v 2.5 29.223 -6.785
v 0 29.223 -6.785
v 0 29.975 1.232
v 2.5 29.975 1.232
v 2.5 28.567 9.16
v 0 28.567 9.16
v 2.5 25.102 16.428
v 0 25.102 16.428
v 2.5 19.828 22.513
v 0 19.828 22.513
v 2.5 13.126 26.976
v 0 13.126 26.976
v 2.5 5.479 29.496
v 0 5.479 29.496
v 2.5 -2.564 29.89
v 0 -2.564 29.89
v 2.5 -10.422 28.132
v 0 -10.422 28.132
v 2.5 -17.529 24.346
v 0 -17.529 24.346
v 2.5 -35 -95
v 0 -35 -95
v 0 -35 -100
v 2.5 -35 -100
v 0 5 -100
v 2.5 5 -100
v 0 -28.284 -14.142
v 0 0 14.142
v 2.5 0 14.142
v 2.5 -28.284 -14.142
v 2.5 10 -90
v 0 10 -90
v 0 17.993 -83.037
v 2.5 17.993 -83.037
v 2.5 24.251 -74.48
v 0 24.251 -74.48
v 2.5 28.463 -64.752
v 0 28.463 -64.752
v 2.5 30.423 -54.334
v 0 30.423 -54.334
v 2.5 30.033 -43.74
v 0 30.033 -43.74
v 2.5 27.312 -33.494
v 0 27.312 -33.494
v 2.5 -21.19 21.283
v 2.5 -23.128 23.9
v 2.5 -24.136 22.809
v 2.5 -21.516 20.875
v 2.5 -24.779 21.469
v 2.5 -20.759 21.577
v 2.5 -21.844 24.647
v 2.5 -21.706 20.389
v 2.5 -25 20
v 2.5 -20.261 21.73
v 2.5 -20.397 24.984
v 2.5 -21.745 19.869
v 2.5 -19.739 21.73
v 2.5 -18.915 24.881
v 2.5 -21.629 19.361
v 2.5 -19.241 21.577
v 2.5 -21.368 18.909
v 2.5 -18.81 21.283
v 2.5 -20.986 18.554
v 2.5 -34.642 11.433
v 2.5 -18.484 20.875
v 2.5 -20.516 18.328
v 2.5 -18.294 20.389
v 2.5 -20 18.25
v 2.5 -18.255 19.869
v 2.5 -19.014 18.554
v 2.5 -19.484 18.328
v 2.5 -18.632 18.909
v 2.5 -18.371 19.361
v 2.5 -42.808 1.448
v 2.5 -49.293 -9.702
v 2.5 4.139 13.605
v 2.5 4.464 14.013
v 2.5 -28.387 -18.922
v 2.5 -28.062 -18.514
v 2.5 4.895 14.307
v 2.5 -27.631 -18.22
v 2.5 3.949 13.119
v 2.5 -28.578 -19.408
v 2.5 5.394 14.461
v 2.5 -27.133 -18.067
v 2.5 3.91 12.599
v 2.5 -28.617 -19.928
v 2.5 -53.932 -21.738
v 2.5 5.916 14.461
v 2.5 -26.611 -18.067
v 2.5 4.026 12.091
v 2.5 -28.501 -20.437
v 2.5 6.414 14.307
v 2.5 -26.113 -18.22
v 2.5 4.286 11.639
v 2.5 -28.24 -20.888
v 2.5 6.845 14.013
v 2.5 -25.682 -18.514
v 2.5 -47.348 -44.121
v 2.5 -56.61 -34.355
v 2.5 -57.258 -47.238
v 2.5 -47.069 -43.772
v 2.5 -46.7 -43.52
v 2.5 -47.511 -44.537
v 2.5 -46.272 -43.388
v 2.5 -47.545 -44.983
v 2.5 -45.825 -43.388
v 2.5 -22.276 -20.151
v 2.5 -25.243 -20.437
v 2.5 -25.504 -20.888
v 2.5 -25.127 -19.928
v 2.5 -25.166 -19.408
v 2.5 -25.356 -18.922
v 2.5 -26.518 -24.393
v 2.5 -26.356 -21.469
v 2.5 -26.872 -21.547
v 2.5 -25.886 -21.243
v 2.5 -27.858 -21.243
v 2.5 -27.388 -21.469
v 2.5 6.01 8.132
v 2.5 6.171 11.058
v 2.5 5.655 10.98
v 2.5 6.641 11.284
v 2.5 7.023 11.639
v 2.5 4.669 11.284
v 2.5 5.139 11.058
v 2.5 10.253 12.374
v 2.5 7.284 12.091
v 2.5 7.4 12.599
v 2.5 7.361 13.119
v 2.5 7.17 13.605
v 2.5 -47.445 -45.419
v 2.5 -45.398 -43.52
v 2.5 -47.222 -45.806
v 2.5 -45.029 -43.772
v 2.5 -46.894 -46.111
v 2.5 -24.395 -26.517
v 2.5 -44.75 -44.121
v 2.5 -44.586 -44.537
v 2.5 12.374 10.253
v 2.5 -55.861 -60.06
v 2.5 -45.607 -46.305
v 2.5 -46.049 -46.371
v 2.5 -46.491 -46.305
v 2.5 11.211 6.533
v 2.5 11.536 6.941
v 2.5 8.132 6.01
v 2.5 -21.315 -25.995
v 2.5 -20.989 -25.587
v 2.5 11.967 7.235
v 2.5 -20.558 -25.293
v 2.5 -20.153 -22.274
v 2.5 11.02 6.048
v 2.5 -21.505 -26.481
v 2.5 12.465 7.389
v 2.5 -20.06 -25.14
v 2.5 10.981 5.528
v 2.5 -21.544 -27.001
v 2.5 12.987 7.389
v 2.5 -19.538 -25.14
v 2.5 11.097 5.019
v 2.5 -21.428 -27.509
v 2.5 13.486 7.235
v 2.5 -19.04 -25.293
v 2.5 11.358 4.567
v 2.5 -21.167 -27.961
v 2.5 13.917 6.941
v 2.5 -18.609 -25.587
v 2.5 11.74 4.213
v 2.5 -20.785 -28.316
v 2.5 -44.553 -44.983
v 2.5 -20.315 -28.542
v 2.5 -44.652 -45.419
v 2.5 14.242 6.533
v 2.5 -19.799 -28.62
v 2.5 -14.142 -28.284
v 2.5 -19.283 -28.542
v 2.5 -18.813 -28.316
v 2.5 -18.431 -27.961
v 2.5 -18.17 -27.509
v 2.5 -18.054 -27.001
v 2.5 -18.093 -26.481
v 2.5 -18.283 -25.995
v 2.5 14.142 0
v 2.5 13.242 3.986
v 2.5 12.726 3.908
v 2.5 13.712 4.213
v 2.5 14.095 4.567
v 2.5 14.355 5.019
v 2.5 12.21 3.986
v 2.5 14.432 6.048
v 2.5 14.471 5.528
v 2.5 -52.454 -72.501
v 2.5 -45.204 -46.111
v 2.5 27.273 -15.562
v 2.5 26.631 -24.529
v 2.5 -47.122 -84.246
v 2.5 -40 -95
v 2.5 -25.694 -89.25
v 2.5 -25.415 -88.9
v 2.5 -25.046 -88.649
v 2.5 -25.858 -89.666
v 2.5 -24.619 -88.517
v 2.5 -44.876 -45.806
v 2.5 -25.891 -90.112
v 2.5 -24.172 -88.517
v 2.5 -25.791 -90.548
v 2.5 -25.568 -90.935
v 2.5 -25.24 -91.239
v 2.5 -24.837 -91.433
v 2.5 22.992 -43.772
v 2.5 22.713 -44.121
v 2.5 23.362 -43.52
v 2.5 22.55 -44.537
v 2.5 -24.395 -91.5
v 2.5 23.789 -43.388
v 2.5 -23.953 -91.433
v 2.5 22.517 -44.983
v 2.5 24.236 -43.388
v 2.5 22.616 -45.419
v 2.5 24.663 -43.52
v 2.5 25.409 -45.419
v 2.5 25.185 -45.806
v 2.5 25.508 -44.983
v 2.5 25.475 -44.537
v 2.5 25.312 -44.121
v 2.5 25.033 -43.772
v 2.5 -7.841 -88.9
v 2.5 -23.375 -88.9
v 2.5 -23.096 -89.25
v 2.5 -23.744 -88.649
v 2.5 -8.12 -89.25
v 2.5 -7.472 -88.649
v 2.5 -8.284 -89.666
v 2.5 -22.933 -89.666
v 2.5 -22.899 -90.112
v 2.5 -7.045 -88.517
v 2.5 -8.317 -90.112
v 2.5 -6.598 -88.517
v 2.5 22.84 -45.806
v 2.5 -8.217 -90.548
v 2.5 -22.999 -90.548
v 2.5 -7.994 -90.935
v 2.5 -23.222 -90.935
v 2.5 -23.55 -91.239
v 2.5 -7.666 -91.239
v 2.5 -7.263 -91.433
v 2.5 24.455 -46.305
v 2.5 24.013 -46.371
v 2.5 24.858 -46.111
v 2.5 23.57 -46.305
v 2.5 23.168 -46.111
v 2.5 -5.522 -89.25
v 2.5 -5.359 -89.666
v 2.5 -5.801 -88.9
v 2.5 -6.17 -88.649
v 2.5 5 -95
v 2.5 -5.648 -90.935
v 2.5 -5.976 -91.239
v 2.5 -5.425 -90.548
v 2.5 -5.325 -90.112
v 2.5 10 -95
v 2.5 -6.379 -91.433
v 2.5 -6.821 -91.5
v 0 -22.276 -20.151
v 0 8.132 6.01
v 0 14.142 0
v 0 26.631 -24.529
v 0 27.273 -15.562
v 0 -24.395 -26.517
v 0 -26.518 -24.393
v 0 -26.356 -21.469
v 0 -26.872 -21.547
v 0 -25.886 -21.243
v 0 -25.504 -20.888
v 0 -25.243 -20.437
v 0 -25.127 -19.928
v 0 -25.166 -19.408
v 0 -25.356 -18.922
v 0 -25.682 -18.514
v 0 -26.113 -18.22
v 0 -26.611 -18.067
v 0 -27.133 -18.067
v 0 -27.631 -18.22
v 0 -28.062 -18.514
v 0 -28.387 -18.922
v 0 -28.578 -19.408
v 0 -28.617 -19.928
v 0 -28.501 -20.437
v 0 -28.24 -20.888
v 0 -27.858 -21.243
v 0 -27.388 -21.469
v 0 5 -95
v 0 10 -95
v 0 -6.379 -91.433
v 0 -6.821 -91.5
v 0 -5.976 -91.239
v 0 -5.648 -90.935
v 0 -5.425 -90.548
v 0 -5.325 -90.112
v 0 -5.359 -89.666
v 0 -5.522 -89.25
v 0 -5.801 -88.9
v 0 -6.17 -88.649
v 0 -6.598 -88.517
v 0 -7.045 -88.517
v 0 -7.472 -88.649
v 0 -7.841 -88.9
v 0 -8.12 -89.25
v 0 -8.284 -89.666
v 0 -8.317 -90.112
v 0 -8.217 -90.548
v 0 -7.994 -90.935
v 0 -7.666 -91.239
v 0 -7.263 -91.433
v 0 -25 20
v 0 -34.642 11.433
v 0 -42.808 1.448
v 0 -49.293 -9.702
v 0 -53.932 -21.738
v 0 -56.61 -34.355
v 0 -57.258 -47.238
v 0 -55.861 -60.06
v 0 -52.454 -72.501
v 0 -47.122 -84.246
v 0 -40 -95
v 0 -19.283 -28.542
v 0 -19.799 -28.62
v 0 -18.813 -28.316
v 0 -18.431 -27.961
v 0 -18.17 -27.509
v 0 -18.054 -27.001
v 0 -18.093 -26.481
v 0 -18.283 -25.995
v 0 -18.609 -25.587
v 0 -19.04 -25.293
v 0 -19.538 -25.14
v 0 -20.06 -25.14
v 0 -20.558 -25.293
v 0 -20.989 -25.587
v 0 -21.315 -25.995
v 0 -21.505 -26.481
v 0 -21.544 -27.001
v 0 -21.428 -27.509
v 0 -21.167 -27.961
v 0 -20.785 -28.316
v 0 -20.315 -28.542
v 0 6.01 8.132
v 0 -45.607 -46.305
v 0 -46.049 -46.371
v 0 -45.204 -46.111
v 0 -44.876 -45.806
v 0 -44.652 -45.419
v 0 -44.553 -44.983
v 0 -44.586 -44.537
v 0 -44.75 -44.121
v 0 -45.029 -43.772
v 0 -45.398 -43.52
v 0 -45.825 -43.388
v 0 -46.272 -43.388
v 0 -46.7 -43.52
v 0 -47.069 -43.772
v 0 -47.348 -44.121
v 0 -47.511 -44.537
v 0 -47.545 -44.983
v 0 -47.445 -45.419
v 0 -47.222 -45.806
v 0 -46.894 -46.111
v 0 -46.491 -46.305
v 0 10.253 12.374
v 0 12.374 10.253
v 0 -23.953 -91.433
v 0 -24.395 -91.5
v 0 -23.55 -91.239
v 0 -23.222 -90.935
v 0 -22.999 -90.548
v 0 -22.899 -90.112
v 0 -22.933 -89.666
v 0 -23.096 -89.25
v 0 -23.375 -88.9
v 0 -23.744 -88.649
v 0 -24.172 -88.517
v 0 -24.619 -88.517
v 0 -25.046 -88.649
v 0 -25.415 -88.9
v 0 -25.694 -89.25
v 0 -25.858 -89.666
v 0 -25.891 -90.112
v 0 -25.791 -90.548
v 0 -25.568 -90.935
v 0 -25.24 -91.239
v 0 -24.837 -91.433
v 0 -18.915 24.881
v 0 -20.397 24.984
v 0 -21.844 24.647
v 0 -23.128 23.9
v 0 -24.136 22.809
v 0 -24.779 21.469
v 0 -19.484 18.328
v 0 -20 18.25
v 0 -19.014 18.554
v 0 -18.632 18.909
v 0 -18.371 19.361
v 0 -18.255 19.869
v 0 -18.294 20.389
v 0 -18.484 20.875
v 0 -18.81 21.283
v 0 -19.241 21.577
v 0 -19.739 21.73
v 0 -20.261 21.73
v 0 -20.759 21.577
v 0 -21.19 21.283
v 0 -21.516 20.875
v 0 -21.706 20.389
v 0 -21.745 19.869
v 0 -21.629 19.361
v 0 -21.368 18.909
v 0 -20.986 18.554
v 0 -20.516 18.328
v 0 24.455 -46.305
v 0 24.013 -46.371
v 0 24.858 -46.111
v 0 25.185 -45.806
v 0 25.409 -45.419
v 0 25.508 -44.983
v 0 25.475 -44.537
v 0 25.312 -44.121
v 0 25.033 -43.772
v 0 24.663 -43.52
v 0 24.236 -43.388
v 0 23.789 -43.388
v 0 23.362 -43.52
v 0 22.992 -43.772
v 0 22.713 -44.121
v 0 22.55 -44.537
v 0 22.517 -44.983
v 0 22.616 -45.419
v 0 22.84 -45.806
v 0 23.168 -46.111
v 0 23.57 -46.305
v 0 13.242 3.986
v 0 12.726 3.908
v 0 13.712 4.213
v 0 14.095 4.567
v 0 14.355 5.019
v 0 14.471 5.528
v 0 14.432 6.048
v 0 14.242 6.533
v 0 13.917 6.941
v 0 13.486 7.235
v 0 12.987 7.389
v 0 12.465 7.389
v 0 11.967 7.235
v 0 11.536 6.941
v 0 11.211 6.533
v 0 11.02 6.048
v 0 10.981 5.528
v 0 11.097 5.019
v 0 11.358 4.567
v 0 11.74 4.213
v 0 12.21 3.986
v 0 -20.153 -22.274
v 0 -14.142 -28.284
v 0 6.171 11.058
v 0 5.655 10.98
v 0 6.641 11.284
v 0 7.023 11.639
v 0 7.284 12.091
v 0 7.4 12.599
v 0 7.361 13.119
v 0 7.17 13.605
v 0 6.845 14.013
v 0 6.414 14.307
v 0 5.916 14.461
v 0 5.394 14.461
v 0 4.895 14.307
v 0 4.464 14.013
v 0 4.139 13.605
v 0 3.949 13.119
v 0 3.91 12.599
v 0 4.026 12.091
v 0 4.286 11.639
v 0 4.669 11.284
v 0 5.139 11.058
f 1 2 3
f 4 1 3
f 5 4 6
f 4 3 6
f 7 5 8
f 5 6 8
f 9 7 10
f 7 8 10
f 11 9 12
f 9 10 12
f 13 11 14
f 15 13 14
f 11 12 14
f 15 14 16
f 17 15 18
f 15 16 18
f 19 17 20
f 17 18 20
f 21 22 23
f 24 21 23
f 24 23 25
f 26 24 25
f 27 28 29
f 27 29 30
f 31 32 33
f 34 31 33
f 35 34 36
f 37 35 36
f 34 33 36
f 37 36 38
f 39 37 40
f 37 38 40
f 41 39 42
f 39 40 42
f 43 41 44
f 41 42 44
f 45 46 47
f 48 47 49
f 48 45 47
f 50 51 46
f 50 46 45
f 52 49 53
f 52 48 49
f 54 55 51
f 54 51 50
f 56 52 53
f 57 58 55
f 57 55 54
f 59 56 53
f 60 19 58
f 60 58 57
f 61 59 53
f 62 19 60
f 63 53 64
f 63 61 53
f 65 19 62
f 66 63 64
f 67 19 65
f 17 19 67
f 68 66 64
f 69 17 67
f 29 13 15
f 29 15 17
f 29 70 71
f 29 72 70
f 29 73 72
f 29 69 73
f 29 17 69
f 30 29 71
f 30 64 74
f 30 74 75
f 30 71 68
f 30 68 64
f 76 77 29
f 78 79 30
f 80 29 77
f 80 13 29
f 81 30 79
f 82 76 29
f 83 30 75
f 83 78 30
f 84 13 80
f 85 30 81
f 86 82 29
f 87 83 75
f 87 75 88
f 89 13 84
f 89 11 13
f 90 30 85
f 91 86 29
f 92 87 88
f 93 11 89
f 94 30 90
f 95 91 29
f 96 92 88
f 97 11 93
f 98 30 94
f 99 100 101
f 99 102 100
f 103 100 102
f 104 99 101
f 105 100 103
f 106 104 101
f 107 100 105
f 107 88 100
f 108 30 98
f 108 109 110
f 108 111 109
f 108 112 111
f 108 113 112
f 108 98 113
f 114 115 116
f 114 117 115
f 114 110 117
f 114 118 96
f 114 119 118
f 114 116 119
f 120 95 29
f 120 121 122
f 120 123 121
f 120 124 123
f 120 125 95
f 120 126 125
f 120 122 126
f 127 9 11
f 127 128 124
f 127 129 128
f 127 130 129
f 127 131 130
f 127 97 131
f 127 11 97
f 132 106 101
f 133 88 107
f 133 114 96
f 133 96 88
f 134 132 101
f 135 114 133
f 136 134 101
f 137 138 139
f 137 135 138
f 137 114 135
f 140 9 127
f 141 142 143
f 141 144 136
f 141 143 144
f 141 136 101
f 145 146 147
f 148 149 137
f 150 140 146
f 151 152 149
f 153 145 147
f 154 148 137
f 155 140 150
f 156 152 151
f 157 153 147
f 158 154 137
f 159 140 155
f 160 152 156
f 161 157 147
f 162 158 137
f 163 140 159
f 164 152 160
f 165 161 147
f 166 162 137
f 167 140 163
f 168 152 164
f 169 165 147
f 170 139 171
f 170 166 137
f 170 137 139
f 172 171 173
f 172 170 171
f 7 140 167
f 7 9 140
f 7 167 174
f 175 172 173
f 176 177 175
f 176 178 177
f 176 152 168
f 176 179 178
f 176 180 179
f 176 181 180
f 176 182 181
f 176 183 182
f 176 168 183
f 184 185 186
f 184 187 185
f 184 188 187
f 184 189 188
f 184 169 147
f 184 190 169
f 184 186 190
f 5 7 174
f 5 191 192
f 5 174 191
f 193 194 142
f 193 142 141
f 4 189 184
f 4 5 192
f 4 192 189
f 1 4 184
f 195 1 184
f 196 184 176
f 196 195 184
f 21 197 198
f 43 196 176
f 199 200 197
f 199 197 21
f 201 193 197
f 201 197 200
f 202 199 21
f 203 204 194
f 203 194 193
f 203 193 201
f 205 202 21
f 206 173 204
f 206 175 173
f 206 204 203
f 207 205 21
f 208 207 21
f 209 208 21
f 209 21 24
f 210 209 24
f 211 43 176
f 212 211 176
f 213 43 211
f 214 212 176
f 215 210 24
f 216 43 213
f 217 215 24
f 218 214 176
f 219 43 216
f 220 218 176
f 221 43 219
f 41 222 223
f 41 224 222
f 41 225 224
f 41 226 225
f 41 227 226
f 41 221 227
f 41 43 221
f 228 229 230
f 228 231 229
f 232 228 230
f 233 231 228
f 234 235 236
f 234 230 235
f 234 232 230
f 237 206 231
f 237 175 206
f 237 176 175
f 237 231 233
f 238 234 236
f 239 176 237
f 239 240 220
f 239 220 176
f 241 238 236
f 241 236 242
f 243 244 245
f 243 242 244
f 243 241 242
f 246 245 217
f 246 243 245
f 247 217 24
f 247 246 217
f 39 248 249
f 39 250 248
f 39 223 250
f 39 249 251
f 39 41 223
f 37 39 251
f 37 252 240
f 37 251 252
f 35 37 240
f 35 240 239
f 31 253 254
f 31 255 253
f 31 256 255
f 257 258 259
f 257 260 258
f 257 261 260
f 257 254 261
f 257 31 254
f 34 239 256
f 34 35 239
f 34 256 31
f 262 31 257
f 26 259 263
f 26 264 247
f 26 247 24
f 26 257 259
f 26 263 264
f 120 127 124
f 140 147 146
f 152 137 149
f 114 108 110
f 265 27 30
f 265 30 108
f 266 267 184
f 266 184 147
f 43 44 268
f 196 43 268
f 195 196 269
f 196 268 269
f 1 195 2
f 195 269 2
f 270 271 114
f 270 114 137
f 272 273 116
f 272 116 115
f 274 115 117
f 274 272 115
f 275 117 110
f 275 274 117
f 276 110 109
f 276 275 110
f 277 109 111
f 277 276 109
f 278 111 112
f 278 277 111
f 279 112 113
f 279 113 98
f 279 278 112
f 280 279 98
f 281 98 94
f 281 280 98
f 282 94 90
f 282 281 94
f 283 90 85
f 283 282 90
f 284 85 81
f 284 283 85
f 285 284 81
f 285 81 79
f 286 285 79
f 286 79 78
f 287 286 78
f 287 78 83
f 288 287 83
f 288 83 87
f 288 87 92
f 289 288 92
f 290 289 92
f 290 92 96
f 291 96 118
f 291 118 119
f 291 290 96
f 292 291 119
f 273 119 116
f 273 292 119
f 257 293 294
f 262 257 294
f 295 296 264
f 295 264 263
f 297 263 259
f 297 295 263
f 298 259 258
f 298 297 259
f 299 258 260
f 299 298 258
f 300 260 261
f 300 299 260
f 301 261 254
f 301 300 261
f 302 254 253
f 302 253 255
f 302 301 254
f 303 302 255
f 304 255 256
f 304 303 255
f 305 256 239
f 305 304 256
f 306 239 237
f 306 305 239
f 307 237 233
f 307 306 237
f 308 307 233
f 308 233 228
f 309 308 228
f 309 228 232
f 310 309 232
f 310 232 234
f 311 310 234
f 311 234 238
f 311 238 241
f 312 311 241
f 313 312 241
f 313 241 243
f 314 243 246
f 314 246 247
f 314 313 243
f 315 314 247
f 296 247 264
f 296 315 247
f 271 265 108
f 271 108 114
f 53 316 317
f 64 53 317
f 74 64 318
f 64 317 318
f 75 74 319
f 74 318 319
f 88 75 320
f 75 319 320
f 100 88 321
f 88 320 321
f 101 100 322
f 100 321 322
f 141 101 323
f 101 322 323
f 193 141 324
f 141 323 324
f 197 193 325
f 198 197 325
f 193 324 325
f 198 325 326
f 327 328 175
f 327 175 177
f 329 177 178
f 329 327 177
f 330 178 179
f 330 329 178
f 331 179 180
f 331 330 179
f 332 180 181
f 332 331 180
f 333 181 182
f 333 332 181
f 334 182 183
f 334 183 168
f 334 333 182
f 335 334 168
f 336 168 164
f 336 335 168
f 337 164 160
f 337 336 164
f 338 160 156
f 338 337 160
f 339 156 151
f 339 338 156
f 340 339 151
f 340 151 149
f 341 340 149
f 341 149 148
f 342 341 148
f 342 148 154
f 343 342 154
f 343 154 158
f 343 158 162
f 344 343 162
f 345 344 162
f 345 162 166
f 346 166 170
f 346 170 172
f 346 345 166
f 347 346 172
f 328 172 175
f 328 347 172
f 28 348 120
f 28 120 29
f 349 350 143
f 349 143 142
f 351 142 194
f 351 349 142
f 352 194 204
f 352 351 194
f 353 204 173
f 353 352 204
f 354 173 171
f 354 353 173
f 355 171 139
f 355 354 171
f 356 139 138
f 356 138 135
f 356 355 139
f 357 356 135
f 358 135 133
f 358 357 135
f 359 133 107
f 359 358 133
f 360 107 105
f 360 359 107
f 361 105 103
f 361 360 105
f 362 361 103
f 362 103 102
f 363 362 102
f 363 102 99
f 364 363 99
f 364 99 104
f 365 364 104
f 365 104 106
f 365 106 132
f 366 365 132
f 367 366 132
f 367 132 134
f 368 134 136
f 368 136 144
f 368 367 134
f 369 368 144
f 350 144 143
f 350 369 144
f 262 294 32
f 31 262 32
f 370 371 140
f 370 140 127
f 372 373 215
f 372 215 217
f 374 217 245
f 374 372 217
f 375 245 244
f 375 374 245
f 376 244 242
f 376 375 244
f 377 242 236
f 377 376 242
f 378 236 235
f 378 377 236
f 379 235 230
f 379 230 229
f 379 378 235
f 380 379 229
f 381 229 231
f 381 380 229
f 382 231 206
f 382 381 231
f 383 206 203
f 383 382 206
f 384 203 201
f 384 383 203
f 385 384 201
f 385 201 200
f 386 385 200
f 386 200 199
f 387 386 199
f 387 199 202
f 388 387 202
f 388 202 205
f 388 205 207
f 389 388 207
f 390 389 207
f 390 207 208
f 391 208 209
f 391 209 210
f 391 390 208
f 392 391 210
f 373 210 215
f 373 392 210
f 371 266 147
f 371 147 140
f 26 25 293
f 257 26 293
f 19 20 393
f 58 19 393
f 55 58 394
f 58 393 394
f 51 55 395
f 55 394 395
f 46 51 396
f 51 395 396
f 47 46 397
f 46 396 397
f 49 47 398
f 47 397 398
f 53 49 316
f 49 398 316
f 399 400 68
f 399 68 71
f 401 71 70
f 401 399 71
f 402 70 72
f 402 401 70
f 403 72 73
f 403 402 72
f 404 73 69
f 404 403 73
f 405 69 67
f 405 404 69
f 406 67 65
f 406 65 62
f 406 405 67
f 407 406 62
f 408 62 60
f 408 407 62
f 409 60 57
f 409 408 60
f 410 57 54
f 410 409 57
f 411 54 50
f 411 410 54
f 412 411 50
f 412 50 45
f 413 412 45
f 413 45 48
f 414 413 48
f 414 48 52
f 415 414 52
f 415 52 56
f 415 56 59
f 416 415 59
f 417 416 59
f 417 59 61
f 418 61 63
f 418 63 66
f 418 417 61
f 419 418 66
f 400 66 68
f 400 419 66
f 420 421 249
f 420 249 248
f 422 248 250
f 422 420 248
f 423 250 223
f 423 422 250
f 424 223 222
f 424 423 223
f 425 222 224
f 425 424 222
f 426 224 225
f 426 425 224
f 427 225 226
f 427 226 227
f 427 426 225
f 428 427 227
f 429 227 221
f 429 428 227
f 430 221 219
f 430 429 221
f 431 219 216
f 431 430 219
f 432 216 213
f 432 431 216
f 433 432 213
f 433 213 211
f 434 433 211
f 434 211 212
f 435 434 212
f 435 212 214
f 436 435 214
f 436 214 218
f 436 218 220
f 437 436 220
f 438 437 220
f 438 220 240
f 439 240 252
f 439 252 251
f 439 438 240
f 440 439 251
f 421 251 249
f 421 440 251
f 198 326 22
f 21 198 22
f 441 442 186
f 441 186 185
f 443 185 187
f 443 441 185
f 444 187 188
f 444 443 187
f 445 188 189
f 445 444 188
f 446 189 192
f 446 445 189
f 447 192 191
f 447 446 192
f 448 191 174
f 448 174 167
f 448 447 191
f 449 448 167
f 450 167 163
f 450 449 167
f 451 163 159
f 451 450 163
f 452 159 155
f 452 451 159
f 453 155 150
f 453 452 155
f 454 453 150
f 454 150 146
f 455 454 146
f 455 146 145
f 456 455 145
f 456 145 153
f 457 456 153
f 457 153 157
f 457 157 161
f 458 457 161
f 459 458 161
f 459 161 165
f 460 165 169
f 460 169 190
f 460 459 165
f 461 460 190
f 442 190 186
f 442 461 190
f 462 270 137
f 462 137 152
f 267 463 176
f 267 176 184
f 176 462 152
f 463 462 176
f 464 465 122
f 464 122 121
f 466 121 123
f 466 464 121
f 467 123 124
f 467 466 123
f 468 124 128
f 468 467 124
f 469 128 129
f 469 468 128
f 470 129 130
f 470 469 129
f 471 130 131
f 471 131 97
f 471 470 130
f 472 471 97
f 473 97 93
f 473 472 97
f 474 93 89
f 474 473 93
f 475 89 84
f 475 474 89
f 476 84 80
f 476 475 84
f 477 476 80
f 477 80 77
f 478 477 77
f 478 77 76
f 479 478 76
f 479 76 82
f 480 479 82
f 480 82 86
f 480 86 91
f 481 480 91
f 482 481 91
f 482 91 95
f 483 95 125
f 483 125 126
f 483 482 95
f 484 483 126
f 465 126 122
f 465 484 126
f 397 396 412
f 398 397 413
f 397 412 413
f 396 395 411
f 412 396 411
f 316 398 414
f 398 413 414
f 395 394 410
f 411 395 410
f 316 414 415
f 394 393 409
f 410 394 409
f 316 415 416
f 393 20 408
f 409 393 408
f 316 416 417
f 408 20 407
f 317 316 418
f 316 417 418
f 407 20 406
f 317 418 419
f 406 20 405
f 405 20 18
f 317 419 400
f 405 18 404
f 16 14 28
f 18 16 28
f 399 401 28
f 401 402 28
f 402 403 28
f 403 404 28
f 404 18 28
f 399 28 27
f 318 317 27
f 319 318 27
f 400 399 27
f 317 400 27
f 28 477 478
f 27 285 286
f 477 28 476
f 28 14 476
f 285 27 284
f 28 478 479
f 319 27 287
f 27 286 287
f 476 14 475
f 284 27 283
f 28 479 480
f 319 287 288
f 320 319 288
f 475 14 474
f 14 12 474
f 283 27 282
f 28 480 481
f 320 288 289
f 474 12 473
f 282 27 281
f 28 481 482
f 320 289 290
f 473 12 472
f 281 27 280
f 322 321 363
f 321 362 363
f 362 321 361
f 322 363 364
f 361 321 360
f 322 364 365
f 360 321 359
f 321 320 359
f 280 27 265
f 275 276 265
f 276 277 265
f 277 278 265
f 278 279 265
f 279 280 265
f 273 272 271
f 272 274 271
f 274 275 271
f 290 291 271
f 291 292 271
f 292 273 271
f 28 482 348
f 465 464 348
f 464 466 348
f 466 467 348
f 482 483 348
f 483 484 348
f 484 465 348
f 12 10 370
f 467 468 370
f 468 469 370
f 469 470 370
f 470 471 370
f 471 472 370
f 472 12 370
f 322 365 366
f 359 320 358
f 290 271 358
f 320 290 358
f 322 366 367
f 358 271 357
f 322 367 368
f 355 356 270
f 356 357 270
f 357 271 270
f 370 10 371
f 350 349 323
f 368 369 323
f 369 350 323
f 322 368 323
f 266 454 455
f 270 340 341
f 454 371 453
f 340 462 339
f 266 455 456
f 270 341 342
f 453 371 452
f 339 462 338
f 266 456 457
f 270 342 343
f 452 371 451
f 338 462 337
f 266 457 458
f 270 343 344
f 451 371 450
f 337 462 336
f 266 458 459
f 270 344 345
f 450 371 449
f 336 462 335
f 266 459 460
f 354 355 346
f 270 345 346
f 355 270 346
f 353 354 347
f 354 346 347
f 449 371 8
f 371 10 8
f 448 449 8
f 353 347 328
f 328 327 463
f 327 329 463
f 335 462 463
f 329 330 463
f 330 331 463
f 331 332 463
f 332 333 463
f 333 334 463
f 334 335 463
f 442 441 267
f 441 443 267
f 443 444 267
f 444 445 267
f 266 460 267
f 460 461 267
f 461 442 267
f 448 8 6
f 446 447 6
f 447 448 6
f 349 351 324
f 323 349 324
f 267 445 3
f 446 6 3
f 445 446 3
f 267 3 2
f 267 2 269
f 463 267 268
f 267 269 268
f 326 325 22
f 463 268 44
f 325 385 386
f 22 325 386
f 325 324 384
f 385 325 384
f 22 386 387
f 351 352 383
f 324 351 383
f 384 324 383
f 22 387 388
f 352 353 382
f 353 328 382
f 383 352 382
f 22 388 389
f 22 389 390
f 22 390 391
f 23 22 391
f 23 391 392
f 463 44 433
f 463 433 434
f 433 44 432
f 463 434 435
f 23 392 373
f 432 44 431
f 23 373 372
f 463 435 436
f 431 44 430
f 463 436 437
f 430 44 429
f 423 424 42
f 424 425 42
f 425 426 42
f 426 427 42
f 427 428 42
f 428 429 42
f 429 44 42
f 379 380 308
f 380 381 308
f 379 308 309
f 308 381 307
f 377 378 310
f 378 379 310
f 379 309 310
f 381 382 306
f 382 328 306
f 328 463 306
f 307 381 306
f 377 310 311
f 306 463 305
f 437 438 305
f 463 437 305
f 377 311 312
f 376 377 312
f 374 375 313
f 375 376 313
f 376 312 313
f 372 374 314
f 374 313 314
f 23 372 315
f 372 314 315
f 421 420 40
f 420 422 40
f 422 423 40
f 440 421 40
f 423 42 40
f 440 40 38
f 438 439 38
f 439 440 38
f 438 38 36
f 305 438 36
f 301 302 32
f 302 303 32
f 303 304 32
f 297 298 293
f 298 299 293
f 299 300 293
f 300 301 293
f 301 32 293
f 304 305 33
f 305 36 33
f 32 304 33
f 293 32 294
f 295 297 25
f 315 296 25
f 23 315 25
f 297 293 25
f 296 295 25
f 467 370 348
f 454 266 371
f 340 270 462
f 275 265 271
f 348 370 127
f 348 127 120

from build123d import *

# Parameters (mm, degrees)
CROQUIS1_R              = 1.75
CROQUIS1_R_2            = 1.5
SALIENTE_EXTRUIR1_DEPTH = 2.5


with BuildPart() as part:
    # Croquis1 → Saliente-Extruir1 (new body)
    with BuildSketch(Plane(origin=(0, 0, 0), x_dir=(0, 0, -1), z_dir=(1, 0, 0))):
        with BuildLine():
            Line((95, 10), (90, 10))
            ThreePointArc((90, 10), (64.751798433, 28.463425825), (33.494108419, 27.311648705))
            ThreePointArc((33.494108419, 27.311648705), (20.033827629, 26.787261985), (6.785305839, 29.222587577))
            ThreePointArc((6.785305839, 29.222587577), (-24.970289012, 16.62782808), (-24.346472536, -17.528527464))
            ThreePointArc((-24.346472536, -17.528527464), (-24.321884003, -22.514223272), (-20, -25))
            ThreePointArc((-20, -25), (34.355278896, -56.609528466), (95, -40))
            Line((95, -40), (95, -35))
            Line((95, -35), (100, -35))
            Line((100, -35), (100, 5))
            Line((100, 5), (95, 5))
            Line((95, 5), (95, 10))
        make_face()
        with Locations((-12.730077402, 5.654698909)):
            Circle(CROQUIS1_R, mode=Mode.SUBTRACT)
        with Locations((-5.658477353, 12.726298958)):
            Circle(CROQUIS1_R, mode=Mode.SUBTRACT)
        with Locations((26.870057685, -19.798989873)):
            Circle(CROQUIS1_R, mode=Mode.SUBTRACT)
        with Locations((19.797157185, -26.871890373)):
            Circle(CROQUIS1_R, mode=Mode.SUBTRACT)
        with Locations((-20, -20)):
            Circle(CROQUIS1_R, mode=Mode.SUBTRACT)
        with Locations((90, -6.821183735)):
            Circle(CROQUIS1_R_2, mode=Mode.SUBTRACT)
        with Locations((90, -24.395183951)):
            Circle(CROQUIS1_R_2, mode=Mode.SUBTRACT)
        with Locations((44.87119885, -46.048776814)):
            Circle(CROQUIS1_R_2, mode=Mode.SUBTRACT)
        with Locations((44.87119885, 24.012524519)):
            Circle(CROQUIS1_R_2, mode=Mode.SUBTRACT)
        Polygon((-14.142135624, 0), (14.142135624, -28.284271247), (20.150710576, -22.275696296), (24.393351263, -26.518336983), (26.516504294, -24.395183951), (22.273863607, -20.152543264), (28.284271247, -14.142135624), (0, 14.142135624), (-6.01040764, 8.131727984), (-10.253048327, 12.374368671), (-12.374368671, 10.253048327), (-8.131727984, 6.01040764), align=None, mode=Mode.SUBTRACT)
    extrude(amount=SALIENTE_EXTRUIR1_DEPTH)


solid = part.part
